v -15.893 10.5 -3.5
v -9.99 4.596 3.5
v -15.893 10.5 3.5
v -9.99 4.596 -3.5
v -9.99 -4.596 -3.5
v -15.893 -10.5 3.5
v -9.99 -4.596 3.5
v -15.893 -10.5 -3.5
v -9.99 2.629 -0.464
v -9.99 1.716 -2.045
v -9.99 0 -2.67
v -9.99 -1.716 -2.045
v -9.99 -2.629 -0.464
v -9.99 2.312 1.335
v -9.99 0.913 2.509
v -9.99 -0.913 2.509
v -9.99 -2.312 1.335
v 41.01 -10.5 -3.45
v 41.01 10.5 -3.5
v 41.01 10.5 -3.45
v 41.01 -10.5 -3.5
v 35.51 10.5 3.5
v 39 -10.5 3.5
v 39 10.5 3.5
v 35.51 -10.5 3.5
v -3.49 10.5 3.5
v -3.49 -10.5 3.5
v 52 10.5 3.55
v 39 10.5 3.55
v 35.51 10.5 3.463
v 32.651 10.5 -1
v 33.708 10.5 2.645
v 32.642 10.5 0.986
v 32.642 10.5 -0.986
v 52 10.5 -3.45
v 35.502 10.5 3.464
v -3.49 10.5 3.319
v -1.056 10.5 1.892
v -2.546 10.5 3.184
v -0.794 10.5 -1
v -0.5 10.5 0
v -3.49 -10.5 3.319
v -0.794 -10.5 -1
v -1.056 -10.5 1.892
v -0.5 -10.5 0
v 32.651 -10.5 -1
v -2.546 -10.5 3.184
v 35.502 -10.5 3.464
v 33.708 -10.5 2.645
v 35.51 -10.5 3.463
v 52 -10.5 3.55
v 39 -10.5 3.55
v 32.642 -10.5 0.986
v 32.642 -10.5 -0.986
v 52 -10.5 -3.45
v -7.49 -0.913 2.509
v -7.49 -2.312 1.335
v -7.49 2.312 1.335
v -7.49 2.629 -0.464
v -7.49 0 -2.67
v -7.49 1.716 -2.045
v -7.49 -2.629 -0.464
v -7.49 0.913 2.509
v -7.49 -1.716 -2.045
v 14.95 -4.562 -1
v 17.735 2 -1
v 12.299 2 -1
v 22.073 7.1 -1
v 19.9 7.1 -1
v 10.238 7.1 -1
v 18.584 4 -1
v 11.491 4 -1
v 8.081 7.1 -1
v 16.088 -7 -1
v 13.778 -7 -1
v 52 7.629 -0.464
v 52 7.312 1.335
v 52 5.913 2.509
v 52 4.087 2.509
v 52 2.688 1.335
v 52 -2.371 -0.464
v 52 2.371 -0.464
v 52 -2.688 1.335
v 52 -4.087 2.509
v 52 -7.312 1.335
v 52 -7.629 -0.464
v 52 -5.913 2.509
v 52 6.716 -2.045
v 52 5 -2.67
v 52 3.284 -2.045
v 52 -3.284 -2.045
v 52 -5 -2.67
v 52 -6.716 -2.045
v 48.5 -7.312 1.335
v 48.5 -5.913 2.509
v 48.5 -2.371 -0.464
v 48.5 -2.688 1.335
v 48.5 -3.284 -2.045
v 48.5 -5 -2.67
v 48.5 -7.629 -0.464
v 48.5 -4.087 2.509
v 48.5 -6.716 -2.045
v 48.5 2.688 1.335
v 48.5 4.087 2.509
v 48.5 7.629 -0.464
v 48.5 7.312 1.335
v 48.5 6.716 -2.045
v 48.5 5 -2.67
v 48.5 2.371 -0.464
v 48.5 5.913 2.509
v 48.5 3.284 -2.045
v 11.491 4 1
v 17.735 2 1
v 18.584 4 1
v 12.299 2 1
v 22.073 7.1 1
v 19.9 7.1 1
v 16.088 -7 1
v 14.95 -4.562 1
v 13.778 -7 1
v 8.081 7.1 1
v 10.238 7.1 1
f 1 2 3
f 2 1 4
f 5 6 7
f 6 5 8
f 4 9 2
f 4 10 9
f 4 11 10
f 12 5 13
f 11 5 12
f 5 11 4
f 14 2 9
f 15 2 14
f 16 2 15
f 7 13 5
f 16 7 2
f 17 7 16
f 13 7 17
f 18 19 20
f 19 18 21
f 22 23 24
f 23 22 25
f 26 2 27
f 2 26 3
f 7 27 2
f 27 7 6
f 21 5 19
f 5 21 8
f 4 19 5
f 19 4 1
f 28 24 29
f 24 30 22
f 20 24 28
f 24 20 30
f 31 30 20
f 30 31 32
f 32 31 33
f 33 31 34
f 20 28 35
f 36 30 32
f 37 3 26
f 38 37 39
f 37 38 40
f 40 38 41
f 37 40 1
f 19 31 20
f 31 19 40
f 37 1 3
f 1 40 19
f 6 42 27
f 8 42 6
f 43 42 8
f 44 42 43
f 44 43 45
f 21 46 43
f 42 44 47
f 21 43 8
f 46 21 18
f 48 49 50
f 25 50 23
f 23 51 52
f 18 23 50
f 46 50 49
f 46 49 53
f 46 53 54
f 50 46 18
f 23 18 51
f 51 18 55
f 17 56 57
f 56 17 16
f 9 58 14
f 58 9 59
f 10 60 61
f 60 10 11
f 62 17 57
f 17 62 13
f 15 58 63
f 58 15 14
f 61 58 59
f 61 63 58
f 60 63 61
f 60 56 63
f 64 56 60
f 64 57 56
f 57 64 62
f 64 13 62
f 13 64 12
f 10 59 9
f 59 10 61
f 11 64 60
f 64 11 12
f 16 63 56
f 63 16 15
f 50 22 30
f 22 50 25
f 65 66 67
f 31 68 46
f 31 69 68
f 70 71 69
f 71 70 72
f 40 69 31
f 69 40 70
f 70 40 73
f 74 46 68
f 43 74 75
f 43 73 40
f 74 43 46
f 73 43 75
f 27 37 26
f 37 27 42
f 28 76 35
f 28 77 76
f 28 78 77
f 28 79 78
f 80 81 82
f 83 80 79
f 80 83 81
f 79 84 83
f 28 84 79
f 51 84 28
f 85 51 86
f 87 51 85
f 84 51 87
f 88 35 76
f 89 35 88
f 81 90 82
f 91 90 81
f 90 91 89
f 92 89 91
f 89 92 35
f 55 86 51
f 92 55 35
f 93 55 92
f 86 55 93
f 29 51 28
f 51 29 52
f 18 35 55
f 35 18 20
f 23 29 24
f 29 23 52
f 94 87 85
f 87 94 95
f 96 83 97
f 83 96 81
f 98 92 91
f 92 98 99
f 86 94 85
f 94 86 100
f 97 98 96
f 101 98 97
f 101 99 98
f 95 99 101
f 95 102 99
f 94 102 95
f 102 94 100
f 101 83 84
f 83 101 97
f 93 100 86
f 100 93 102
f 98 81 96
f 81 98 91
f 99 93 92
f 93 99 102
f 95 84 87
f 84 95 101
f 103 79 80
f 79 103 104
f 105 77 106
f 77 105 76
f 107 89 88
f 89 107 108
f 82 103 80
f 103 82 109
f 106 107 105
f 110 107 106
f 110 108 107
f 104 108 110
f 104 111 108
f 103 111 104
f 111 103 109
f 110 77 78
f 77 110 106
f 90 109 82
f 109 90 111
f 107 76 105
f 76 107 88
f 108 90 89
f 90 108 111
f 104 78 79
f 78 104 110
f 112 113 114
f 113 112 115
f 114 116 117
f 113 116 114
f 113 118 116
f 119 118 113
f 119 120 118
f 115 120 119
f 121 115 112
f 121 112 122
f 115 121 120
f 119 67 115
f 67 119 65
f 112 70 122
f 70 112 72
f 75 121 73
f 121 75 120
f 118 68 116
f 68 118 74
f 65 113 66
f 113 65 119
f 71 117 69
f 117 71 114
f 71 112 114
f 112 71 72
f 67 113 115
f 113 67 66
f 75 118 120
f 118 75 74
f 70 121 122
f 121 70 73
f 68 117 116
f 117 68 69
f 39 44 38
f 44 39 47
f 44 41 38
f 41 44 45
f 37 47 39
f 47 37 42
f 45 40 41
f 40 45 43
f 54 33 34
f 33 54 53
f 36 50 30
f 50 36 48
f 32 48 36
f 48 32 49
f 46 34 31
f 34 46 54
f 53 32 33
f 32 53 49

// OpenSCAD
//Азотистые основания:    
x=50;     
y=21;     
z=7;      
t=0;        
z2=2.5;
edge=13.49;        
dx=19.0209;   
p=14;  //Перемещине буквы А по плоскости
//Аденин                
difference() {
 translate ([dx/2, t, 0]){                                       
  difference() { 
    #color() translate ([3, 0, 0]) cube ([x+7, y, z], center=true);                      
     rotate([180, 180, 0]) translate([41, 0, 0])

     union() {       

     difference() {
 
      union() {

    translate ([dx/2, t, 0]) {   

     color() translate ([0, 0, 5]) cube ([x-dx/2, y, z+4], center=true);    

      translate([-25, 0, 0]) color() rotate ([0, 0, 45]) cube ([15, 15, z+2], center=true);     

       translate([24.78, -9.5, -1]) cube([10, 19, 5]);
  }
 }   
	translate([-32, 0, 0]) cube([21, 21, 10], center=true);

   translate([-10, -10.5, 2]) cube([50, 21, 5]);
  } 

 }
 #rotate([0, 90, 0]) translate([0, 0, -23]) cylinder(6, 2.67, 2.67);
   translate([-13, -10.5, -1]) cube([39, 21, 5]);
  }       
 } 
}
difference() {

  #translate([39, -10.5, -3.45]) cube([13, 21, 7]);
   #rotate([0, 90, 0]) translate([0, -5, 48.5]) cylinder(5, 2.67, 2.67);
    #rotate([0, 90, 0]) translate([0, 5, 48.5]) cylinder(5, 2.67, 2.67);
 }
  #rotate([90, 0, 0]) translate([-4, 0, -10.5]) cylinder(21, 3.5, 3.5);
   #rotate([90, 0, 0]) translate([36, 0, -10.5]) cylinder(21, 3.5, 3.5);
//Буква А 
difference() {
union () {
 translate([p, -7.55, -1]) rotate ([0, 0, 22]) cube ([2, 16, 2]);
  translate([p, -6.8, 1]) rotate ([45, 90, 22]) cube ([2, 16, 2]);
   translate([p-3.8, 2, -1]) cube ([9, 2, 2]);
}
 translate([p-6, -9, -2]) cube ([15, 2, 4]);
   translate([p-6, 7.1, -2]) cube ([15, 2, 4]);
}
